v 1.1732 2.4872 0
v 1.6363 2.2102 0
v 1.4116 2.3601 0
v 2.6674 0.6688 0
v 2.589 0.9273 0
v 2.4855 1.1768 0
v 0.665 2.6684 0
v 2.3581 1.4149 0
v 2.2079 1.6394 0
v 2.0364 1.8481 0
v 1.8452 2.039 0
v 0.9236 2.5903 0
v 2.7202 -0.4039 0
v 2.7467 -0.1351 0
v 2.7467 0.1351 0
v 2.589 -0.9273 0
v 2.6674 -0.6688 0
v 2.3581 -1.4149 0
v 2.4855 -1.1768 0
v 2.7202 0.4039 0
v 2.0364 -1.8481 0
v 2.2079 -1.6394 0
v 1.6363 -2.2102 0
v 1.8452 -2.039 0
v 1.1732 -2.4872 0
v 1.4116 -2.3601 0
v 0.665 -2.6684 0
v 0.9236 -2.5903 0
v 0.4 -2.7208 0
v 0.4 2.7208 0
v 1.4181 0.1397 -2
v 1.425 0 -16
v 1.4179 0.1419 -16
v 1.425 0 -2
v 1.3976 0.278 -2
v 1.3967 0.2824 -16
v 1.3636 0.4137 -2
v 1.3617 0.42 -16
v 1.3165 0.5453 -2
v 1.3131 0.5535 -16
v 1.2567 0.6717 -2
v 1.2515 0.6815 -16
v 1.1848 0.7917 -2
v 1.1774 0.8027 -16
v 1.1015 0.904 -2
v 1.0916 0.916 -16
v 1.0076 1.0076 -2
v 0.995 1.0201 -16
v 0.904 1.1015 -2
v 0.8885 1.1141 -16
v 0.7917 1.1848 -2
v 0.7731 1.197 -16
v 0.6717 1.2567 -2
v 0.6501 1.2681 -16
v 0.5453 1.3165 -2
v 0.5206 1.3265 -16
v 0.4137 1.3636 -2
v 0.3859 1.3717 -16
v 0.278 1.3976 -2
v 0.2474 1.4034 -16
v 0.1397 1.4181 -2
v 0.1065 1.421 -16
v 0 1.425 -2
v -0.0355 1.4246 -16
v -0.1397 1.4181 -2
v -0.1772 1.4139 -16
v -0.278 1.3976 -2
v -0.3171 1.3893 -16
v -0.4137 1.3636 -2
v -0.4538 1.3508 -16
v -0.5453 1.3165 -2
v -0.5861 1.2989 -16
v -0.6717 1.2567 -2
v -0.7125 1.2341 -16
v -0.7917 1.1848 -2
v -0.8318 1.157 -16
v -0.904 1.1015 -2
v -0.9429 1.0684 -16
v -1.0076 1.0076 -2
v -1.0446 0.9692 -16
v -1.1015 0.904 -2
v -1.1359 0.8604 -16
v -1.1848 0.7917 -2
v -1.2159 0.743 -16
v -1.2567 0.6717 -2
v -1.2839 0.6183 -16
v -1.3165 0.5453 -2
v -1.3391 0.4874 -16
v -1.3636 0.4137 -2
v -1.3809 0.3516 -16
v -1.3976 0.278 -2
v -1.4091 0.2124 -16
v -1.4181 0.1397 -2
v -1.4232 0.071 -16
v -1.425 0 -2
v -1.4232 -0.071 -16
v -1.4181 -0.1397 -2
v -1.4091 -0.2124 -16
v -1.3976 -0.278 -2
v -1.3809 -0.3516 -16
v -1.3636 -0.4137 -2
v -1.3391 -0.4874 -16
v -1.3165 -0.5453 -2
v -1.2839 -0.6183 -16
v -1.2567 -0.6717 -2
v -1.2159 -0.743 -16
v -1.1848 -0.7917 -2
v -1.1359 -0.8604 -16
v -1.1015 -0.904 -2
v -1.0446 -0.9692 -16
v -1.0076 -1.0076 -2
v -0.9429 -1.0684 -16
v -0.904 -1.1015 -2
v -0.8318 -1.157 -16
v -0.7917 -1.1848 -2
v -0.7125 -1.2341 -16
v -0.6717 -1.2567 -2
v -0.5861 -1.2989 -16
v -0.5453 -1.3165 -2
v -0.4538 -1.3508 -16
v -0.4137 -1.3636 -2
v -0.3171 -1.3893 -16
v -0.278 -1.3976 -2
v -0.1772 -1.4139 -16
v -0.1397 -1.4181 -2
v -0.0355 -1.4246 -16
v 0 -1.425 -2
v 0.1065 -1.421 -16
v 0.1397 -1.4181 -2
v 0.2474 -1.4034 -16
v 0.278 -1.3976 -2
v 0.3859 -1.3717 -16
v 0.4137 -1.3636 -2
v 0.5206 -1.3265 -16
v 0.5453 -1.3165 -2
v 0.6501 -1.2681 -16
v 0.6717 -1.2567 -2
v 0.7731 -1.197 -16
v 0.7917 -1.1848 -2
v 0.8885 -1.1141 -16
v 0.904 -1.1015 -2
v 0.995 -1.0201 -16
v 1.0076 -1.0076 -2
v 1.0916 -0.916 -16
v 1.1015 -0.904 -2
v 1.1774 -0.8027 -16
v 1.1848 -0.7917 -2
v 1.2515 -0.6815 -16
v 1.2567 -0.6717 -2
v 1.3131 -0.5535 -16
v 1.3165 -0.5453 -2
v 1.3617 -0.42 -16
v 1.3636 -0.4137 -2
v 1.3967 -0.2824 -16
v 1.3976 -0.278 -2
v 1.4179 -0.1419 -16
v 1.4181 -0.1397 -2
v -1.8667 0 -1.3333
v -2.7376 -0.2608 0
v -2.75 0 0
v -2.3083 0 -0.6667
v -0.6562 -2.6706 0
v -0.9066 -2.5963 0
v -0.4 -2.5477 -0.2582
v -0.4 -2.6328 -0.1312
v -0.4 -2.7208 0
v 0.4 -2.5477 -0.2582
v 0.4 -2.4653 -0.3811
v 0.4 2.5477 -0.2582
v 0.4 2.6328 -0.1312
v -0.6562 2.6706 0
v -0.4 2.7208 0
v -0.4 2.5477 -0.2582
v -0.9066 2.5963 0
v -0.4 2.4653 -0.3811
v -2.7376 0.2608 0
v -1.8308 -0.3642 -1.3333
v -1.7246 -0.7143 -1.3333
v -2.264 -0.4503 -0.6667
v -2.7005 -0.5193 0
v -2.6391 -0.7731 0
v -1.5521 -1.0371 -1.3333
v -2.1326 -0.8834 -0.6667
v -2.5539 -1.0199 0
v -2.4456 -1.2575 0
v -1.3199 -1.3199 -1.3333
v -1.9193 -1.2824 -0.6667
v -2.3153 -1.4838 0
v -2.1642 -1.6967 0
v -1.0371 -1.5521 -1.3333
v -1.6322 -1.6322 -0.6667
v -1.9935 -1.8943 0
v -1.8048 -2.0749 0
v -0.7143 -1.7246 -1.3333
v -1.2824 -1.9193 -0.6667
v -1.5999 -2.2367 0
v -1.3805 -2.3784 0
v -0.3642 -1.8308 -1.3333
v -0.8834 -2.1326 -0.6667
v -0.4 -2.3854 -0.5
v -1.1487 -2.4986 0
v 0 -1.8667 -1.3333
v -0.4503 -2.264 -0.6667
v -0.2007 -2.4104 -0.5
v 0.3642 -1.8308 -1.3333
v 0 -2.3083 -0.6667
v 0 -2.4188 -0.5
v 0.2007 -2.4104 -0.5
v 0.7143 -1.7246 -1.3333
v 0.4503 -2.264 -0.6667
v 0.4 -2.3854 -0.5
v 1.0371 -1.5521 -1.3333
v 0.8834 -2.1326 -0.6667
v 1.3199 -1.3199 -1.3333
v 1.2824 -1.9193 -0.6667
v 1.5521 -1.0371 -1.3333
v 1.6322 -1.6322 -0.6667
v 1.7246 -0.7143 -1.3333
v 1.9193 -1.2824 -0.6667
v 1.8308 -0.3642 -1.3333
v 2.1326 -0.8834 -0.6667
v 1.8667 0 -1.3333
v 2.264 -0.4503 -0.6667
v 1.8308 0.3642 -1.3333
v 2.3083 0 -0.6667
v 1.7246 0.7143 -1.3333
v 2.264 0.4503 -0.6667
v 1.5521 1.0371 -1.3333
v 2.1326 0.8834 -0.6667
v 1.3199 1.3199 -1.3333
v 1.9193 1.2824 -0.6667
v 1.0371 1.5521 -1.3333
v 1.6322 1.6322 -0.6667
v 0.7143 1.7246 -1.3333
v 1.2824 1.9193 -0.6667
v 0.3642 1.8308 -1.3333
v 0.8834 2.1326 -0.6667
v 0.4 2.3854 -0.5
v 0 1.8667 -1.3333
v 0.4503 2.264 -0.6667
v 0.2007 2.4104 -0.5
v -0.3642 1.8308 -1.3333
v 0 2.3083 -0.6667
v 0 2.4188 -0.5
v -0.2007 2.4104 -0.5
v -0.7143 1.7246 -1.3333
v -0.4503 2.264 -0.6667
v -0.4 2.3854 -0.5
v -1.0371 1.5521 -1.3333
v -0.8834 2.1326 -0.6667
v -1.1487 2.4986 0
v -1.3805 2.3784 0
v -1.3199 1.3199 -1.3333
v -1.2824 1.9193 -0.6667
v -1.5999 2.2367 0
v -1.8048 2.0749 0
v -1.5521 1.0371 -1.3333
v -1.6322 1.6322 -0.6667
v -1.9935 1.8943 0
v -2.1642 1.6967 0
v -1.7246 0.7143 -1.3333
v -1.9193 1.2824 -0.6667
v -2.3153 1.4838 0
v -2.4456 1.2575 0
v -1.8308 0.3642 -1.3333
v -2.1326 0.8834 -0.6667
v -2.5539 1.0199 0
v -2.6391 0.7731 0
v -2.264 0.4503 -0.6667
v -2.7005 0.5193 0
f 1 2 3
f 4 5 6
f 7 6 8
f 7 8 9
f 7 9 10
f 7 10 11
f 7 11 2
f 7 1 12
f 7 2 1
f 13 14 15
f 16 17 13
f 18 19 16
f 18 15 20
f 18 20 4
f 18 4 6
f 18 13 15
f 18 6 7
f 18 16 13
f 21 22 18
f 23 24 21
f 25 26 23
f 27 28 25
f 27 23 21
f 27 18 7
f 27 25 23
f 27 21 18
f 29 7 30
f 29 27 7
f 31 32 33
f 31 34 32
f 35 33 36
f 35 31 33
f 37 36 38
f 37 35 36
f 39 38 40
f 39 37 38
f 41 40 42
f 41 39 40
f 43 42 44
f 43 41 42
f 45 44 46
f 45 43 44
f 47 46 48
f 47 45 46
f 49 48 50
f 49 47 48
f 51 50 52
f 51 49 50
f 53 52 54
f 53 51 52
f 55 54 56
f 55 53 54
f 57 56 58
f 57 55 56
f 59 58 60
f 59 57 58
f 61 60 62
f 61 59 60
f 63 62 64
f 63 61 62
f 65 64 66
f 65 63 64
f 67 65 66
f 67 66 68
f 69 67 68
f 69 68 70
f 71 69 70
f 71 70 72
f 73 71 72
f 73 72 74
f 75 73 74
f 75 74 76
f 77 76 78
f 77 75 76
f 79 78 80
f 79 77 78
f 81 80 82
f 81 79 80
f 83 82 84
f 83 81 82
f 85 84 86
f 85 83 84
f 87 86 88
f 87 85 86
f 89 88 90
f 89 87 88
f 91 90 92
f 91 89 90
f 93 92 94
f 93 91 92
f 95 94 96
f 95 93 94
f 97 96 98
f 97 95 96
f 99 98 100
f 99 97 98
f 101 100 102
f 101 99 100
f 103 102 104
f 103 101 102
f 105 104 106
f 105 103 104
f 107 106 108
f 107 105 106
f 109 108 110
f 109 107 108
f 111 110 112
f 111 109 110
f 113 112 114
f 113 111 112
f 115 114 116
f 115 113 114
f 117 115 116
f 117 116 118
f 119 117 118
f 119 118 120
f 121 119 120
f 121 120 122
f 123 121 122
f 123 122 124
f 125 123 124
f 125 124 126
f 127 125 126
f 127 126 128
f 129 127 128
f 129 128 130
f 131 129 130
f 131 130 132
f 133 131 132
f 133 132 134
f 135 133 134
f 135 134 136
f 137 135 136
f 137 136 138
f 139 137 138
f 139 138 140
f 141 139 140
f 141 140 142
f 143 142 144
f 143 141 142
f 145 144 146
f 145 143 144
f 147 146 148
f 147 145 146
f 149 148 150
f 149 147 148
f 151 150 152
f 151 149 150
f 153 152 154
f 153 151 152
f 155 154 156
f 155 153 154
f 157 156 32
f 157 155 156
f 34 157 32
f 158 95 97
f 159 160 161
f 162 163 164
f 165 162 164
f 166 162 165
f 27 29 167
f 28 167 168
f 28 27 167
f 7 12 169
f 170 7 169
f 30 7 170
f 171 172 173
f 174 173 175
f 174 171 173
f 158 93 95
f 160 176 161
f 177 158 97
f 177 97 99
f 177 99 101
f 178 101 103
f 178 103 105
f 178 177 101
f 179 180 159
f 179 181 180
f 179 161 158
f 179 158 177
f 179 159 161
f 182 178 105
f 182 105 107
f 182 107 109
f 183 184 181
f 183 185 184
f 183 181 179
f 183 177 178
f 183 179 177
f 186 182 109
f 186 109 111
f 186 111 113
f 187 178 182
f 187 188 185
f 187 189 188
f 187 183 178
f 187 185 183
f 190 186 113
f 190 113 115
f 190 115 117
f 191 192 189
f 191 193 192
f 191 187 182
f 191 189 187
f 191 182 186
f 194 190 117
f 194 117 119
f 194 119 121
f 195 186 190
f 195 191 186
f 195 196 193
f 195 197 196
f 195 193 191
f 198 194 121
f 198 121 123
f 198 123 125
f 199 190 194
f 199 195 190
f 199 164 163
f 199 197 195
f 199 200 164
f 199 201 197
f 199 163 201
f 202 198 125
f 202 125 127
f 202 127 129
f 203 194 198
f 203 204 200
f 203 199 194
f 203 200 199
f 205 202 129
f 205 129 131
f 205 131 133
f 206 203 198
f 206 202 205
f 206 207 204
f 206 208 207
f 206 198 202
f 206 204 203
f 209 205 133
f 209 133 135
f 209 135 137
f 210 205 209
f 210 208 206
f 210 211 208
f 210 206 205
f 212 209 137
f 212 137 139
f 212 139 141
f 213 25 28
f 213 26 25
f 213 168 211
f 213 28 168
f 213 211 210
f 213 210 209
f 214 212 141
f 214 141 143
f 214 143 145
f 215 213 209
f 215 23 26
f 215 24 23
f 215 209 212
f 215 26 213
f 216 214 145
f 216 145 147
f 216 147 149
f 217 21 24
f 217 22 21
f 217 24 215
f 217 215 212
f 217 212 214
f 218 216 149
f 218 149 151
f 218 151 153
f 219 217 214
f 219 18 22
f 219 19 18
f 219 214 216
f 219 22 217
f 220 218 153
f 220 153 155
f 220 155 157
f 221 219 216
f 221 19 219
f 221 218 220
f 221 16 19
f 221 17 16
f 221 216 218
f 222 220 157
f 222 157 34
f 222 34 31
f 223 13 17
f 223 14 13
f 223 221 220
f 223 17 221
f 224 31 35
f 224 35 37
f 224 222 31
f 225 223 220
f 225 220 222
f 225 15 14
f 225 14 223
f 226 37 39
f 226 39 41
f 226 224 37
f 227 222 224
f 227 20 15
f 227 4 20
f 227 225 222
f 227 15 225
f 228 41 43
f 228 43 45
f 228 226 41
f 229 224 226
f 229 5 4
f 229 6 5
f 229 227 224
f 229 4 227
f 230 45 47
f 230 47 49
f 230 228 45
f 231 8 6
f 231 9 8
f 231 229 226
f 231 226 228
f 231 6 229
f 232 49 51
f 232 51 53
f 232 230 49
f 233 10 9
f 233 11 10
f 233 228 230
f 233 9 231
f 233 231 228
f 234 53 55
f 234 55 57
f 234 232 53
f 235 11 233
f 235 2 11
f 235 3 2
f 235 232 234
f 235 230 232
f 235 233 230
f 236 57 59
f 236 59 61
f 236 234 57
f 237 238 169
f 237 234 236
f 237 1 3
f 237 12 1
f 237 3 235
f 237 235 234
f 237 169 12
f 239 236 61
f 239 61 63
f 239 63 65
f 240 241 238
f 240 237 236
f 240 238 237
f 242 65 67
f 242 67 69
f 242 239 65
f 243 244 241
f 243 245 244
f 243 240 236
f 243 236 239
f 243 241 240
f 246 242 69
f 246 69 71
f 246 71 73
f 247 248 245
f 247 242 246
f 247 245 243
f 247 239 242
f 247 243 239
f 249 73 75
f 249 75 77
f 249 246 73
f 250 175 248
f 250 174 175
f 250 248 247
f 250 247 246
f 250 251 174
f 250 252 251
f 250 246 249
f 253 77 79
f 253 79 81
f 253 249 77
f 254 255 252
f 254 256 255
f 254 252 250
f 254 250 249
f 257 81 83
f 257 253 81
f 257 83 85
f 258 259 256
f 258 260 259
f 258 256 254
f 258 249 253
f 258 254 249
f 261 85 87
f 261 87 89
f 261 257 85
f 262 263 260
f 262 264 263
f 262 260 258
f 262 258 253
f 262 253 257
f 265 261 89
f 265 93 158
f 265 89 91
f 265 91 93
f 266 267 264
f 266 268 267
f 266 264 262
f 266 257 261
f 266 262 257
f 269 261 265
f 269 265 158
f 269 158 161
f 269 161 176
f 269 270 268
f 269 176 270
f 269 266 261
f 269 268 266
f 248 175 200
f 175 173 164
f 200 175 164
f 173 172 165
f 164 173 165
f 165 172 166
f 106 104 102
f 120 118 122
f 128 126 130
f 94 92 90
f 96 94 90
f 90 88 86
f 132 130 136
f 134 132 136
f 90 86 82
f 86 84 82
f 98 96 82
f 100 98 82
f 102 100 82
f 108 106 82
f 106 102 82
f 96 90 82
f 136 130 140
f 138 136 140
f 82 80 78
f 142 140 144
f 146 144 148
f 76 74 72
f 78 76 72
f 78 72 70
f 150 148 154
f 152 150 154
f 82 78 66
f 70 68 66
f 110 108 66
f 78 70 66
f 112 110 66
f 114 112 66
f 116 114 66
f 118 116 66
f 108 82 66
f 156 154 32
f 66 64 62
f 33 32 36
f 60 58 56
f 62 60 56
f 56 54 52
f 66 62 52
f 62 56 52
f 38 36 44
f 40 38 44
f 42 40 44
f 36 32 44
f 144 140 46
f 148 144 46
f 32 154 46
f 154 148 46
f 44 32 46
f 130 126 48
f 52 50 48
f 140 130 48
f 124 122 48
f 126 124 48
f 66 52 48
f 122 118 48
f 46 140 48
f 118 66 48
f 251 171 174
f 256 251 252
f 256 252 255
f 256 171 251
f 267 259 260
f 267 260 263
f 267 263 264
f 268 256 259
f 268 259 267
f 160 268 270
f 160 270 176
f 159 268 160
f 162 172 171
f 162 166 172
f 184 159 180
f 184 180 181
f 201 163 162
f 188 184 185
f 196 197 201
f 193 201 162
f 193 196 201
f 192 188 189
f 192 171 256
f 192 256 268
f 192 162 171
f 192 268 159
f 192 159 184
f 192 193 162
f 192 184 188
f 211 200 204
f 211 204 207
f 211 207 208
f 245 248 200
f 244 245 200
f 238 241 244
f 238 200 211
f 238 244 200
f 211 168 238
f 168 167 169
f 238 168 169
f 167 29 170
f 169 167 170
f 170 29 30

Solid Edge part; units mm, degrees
sketch "Sketch1" plane through (0, 0, 0) normal (0, 0, 1) x (1, 0, 0)
  circle A0 centre (0, 0) radius 1.425
extrude "Protrusion1" add sketch "Sketch1" against normal blind 16
sketch "Sketch2" plane through (0, 0, 0) normal (0, -1, 0) x (1, 0, 0)
  line L0 (-1.425, -2) -> (-2.75, 0)
  line L1 (-2.75, 0) -> (0, 0)
  line L2 (-1.425, -2) -> (-1.425, 0)
revolve "RevolvedProtrusion1" add sketch "Sketch2" angle 360 about axis through (0, 0, 0) along (0, 0, 1) material side at (-2.0458, 0, -0.9724)
sketch "Sketch3" plane through (0, 0, 0) normal (0, 0, 1) x (0, -1, 0)
  line L0 (-3.7678, -0.4) -> (3.7678, -0.4)
  line L1 (3.7678, -0.4) -> (3.7678, 0.4)
  line L2 (3.7678, 0.4) -> (-3.7678, 0.4)
  line L3 (-3.7678, 0.4) -> (-3.7678, -0.4)
extrude "ExtrudedCutout_1" cut sketch "Sketch3" against normal blind 0.5
properties material "Graphite"
